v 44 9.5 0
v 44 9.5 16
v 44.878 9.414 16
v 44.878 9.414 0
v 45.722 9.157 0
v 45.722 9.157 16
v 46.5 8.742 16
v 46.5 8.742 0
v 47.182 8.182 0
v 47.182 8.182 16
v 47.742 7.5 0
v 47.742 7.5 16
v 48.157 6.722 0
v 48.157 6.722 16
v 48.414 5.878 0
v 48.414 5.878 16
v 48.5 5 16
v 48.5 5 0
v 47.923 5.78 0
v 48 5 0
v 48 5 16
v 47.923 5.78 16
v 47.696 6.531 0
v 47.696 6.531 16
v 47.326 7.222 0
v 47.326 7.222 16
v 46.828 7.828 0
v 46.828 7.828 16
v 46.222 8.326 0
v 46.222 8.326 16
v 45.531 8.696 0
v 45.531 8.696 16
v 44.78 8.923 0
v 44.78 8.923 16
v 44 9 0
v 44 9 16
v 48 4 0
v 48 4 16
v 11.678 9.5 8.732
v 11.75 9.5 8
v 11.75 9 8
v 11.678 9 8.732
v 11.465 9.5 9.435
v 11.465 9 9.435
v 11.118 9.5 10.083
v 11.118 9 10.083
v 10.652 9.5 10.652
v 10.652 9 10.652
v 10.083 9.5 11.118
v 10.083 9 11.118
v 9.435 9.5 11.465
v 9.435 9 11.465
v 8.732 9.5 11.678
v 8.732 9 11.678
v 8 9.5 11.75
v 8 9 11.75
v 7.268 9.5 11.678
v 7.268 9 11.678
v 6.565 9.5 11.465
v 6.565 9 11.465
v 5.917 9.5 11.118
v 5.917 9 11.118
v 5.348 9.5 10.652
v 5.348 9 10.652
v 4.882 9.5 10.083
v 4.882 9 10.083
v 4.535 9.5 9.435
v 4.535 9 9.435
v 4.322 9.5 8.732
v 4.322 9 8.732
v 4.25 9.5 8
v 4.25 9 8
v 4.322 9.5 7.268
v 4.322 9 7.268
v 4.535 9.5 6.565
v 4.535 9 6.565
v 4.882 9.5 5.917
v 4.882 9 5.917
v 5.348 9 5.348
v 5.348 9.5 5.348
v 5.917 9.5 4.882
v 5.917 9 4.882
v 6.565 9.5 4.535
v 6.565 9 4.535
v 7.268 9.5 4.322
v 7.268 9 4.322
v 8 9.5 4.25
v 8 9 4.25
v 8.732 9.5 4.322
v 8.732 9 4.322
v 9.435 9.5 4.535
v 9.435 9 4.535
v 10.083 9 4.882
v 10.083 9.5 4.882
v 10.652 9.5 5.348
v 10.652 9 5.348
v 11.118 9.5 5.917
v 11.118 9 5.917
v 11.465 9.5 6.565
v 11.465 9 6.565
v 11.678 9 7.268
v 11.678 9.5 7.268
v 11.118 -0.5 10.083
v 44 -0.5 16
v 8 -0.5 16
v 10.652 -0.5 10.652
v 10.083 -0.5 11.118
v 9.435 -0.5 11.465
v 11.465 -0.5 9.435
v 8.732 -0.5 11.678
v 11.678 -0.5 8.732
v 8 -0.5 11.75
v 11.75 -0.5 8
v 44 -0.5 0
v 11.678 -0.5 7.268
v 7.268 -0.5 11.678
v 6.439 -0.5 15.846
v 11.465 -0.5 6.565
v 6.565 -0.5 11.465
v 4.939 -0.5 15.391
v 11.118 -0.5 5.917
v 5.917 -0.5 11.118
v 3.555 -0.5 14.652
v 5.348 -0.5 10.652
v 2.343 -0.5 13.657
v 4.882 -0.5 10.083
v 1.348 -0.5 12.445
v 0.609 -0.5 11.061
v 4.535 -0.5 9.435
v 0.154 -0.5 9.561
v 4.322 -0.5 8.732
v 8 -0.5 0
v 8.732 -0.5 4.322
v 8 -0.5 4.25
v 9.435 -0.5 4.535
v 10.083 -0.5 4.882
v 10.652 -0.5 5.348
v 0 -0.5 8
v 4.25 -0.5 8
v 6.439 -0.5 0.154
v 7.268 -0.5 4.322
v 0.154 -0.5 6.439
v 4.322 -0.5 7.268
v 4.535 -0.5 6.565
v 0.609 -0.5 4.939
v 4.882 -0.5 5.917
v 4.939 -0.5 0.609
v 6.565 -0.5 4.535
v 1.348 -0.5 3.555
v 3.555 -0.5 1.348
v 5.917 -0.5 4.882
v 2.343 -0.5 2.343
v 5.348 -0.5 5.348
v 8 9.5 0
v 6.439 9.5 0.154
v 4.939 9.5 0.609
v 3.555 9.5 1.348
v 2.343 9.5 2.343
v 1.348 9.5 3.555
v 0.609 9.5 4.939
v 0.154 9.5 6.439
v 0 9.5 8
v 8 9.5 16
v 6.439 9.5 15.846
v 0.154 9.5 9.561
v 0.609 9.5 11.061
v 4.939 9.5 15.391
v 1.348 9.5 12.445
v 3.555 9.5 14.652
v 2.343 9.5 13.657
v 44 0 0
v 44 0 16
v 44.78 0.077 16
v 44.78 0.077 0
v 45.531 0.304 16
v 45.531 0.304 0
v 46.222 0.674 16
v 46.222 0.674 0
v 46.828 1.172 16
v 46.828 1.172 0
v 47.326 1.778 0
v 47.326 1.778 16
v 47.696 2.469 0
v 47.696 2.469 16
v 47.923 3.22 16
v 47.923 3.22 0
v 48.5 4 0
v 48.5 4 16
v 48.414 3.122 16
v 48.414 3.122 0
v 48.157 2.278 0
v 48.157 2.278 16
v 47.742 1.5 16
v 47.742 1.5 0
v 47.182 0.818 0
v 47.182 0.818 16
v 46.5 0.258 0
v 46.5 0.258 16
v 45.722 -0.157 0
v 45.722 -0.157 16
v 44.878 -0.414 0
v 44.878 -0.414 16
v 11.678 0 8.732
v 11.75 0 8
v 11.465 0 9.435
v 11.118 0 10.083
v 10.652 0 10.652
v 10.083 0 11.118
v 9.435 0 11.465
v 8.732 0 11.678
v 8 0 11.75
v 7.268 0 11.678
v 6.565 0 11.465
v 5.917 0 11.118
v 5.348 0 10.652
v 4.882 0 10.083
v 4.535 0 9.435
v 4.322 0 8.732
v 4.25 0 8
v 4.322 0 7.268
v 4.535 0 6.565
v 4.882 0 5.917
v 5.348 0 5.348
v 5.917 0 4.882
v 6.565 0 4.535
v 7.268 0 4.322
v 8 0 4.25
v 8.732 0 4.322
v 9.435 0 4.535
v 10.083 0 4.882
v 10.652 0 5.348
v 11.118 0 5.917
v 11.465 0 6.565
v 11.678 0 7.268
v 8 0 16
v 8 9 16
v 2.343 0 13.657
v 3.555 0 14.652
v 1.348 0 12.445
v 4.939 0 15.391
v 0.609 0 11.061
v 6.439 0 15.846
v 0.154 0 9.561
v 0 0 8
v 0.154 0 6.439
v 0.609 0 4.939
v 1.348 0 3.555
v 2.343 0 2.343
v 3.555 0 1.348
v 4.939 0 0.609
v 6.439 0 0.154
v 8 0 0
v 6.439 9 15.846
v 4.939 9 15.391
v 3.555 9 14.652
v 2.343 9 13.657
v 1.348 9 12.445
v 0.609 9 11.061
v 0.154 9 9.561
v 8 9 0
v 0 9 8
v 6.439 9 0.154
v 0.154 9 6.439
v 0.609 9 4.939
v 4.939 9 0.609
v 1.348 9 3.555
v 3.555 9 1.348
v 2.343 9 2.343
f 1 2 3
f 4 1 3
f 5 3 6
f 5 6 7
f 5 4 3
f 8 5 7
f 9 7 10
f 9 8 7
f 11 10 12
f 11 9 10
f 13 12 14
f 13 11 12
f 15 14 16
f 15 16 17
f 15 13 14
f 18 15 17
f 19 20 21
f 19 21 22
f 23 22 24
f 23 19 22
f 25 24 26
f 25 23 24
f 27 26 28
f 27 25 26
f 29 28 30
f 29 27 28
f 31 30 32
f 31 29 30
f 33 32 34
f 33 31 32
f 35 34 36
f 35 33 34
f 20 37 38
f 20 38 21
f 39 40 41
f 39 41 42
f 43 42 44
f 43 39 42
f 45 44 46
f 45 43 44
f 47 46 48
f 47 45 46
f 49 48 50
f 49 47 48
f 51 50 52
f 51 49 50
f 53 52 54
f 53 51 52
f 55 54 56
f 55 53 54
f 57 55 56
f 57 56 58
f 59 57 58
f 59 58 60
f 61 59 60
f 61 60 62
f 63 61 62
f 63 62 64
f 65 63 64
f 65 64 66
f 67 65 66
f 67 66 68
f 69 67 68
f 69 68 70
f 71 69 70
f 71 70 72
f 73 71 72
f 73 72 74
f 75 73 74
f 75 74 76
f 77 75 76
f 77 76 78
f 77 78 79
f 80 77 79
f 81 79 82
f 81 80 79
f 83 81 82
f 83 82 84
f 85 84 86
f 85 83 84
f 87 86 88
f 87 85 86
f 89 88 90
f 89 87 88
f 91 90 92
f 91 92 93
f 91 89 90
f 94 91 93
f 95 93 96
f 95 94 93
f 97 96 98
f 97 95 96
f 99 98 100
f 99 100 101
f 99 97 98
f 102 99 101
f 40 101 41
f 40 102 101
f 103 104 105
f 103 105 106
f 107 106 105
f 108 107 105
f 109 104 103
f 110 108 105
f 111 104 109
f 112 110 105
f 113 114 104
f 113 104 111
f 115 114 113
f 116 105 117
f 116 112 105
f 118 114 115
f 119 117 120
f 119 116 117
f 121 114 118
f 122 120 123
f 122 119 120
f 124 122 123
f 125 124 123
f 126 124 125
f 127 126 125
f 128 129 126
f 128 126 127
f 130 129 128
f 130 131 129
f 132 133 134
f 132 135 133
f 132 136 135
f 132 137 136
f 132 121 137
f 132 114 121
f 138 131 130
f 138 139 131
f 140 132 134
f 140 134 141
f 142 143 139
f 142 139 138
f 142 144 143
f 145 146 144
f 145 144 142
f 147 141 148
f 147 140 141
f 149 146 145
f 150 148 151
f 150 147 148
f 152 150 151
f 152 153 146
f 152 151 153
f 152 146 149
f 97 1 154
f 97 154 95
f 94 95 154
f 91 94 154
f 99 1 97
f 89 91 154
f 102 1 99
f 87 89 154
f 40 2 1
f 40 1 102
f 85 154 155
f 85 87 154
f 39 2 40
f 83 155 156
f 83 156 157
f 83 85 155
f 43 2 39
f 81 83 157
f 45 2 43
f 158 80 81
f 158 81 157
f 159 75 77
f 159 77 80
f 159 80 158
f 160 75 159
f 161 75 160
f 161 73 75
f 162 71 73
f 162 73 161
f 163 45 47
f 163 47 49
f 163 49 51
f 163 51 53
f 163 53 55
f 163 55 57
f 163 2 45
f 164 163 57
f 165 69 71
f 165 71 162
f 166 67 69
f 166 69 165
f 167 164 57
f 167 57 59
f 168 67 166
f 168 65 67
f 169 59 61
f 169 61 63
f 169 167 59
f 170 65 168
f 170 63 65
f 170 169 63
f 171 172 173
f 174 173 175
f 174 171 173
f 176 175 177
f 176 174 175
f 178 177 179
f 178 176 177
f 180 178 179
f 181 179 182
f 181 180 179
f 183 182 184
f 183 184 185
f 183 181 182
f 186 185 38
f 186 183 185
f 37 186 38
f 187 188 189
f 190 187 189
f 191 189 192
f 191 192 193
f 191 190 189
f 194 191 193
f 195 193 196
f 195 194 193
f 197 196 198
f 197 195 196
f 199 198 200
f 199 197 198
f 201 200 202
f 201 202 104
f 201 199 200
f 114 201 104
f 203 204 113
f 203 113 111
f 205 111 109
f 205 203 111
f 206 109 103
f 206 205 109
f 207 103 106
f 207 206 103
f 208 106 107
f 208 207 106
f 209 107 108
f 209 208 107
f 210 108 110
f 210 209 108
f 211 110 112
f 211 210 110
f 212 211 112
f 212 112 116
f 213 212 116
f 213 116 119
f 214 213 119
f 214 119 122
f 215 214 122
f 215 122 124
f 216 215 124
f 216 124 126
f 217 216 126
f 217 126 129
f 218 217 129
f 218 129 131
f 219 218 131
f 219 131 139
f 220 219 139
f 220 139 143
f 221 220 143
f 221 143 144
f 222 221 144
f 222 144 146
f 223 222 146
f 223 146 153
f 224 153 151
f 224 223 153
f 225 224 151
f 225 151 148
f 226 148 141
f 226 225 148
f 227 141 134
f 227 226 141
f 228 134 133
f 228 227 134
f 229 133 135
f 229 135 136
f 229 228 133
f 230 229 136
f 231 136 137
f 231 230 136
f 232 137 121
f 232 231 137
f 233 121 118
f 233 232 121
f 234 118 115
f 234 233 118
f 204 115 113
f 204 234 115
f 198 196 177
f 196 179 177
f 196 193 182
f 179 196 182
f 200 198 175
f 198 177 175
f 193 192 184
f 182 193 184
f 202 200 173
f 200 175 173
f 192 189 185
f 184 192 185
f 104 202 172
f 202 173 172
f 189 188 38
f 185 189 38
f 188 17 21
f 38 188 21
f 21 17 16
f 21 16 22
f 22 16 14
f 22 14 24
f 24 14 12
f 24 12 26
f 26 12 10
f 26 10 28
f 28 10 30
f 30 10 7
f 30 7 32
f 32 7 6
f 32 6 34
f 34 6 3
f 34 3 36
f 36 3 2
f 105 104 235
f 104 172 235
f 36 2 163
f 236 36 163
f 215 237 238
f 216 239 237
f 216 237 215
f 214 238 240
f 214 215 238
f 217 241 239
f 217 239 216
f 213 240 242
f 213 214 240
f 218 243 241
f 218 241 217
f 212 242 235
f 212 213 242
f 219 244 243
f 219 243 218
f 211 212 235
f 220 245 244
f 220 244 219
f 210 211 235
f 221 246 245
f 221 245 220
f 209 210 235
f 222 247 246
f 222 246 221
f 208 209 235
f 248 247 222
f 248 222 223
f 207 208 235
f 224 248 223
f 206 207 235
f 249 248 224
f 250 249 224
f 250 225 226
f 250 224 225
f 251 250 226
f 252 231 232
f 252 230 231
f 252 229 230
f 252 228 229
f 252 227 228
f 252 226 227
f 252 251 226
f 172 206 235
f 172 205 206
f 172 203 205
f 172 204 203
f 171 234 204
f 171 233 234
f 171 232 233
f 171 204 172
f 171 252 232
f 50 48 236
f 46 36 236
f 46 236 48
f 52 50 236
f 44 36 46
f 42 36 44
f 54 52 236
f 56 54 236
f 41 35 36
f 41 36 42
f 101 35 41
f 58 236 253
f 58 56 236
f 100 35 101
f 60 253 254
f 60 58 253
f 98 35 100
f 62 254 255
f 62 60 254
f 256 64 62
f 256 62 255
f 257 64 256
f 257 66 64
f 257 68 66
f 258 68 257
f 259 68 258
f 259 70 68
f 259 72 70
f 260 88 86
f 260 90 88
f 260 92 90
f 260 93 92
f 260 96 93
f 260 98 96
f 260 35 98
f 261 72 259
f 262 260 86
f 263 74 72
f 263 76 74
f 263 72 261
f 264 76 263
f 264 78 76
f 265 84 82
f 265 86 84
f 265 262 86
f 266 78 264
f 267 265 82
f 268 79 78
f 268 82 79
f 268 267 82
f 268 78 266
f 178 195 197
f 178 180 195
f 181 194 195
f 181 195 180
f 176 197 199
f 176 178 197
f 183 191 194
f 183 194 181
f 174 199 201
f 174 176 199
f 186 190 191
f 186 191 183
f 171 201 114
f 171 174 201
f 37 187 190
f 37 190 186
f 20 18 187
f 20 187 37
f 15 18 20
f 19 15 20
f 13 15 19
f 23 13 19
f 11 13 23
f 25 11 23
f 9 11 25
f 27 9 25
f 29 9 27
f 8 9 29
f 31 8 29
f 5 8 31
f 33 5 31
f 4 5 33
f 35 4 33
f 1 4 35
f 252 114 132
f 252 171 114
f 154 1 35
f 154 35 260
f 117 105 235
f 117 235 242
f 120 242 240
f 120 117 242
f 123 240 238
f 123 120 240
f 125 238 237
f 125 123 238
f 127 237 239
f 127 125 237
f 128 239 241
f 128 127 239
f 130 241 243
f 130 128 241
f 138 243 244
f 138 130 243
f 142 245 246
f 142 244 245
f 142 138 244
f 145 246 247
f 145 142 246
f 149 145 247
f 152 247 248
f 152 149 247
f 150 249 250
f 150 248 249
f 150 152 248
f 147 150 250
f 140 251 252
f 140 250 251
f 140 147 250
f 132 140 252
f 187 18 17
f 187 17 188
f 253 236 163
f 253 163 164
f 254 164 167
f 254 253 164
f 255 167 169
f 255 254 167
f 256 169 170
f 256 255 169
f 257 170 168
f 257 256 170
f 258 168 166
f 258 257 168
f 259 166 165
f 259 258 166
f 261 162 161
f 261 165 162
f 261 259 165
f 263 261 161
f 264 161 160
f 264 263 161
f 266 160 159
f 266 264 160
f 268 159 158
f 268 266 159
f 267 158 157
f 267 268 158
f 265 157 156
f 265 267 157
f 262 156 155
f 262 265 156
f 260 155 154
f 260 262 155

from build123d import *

# Parameters (mm, degrees)
BASE_FLANGE1_DEPTH  = 16
CUT_EXTRUDE1_DEPTH  = 53.04084934
SKETCH7_R           = 3.75
BOSS_EXTRUDE1_DEPTH = 2
CUT_EXTRUDE2_START  = -2
SKETCH8_R           = 3.75
CUT_EXTRUDE2_DEPTH  = 2
BOSS_EXTRUDE2_START = -2
SKETCH9_R           = 3.75
BOSS_EXTRUDE2_DEPTH = 2
CUT_EXTRUDE4_START  = -2
SKETCH10_R          = 3.75
CUT_EXTRUDE4_DEPTH  = 2


# Sheet-metal steps are written as plain solids
with BuildPart() as part:
    # Sketch1 → Base-Flange1 (new body)
    with BuildSketch(Plane.XY):
        with BuildLine():
            Line((0, 0), (44, 0))
            ThreePointArc((44, 0), (46.828427125, 1.171572875), (48, 4))
            Line((48, 4), (48, 5))
            ThreePointArc((48, 5), (46.828427125, 7.828427125), (44, 9))
            Line((44, 9), (0, 9))
            Line((0, 9), (0, 9.5))
            Line((0, 9.5), (44, 9.5))
            ThreePointArc((44, 9.5), (47.181980515, 8.181980515), (48.5, 5))
            Line((48.5, 5), (48.5, 4))
            ThreePointArc((48.5, 4), (47.181980515, 0.818019485), (44, -0.5))
            Line((44, -0.5), (0, -0.5))
            Line((0, -0.5), (0, 0))
        make_face()
    extrude(amount=BASE_FLANGE1_DEPTH)

    # Sketch6 → Cut-Extrude1 (cut, through all)
    with BuildSketch(Plane.XZ.offset(0.5)):
        with BuildLine():
            Line((8, 0), (8, -3.97427409))
            Line((8, -3.97427409), (-3.94829055, -3.97427409))
            Line((-3.94829055, -3.97427409), (-3.94829055, 19.074328647))
            Line((-3.94829055, 19.074328647), (8, 19.074328647))
            Line((8, 19.074328647), (8, 16))
            ThreePointArc((8, 16), (0, 8), (8, 0))
        make_face()
    extrude(amount=-CUT_EXTRUDE1_DEPTH, mode=Mode.SUBTRACT)

    # Sketch7 → Boss-Extrude1 (add)
    with BuildSketch(Plane(origin=(0, 9.5, 0), x_dir=(1, 0, 0), z_dir=(0, 1, 0))):
        with Locations(Location((8, -8, 0), (0, 0, 180))):
            Circle(SKETCH7_R)
    extrude(amount=-BOSS_EXTRUDE1_DEPTH)

    # Sketch8 → Cut-Extrude2 (cut)
    with BuildSketch(Plane.XZ.offset(-7.5).offset(CUT_EXTRUDE2_START)):
        with Locations((8, 8)):
            Circle(SKETCH8_R)
    extrude(amount=CUT_EXTRUDE2_DEPTH, mode=Mode.SUBTRACT)

    # Sketch9 → Boss-Extrude2 (add)
    with BuildSketch(Plane.XZ.offset(0.5).offset(BOSS_EXTRUDE2_START)):
        with Locations((8, 8)):
            Circle(SKETCH9_R)
    extrude(amount=BOSS_EXTRUDE2_DEPTH)

    # Sketch10 → Cut-Extrude4 (cut)
    with BuildSketch(Plane.XZ.offset(0.5).offset(CUT_EXTRUDE4_START)):
        with Locations((8, 8)):
            Circle(SKETCH10_R)
    extrude(amount=CUT_EXTRUDE4_DEPTH, mode=Mode.SUBTRACT)


solid = part.part
